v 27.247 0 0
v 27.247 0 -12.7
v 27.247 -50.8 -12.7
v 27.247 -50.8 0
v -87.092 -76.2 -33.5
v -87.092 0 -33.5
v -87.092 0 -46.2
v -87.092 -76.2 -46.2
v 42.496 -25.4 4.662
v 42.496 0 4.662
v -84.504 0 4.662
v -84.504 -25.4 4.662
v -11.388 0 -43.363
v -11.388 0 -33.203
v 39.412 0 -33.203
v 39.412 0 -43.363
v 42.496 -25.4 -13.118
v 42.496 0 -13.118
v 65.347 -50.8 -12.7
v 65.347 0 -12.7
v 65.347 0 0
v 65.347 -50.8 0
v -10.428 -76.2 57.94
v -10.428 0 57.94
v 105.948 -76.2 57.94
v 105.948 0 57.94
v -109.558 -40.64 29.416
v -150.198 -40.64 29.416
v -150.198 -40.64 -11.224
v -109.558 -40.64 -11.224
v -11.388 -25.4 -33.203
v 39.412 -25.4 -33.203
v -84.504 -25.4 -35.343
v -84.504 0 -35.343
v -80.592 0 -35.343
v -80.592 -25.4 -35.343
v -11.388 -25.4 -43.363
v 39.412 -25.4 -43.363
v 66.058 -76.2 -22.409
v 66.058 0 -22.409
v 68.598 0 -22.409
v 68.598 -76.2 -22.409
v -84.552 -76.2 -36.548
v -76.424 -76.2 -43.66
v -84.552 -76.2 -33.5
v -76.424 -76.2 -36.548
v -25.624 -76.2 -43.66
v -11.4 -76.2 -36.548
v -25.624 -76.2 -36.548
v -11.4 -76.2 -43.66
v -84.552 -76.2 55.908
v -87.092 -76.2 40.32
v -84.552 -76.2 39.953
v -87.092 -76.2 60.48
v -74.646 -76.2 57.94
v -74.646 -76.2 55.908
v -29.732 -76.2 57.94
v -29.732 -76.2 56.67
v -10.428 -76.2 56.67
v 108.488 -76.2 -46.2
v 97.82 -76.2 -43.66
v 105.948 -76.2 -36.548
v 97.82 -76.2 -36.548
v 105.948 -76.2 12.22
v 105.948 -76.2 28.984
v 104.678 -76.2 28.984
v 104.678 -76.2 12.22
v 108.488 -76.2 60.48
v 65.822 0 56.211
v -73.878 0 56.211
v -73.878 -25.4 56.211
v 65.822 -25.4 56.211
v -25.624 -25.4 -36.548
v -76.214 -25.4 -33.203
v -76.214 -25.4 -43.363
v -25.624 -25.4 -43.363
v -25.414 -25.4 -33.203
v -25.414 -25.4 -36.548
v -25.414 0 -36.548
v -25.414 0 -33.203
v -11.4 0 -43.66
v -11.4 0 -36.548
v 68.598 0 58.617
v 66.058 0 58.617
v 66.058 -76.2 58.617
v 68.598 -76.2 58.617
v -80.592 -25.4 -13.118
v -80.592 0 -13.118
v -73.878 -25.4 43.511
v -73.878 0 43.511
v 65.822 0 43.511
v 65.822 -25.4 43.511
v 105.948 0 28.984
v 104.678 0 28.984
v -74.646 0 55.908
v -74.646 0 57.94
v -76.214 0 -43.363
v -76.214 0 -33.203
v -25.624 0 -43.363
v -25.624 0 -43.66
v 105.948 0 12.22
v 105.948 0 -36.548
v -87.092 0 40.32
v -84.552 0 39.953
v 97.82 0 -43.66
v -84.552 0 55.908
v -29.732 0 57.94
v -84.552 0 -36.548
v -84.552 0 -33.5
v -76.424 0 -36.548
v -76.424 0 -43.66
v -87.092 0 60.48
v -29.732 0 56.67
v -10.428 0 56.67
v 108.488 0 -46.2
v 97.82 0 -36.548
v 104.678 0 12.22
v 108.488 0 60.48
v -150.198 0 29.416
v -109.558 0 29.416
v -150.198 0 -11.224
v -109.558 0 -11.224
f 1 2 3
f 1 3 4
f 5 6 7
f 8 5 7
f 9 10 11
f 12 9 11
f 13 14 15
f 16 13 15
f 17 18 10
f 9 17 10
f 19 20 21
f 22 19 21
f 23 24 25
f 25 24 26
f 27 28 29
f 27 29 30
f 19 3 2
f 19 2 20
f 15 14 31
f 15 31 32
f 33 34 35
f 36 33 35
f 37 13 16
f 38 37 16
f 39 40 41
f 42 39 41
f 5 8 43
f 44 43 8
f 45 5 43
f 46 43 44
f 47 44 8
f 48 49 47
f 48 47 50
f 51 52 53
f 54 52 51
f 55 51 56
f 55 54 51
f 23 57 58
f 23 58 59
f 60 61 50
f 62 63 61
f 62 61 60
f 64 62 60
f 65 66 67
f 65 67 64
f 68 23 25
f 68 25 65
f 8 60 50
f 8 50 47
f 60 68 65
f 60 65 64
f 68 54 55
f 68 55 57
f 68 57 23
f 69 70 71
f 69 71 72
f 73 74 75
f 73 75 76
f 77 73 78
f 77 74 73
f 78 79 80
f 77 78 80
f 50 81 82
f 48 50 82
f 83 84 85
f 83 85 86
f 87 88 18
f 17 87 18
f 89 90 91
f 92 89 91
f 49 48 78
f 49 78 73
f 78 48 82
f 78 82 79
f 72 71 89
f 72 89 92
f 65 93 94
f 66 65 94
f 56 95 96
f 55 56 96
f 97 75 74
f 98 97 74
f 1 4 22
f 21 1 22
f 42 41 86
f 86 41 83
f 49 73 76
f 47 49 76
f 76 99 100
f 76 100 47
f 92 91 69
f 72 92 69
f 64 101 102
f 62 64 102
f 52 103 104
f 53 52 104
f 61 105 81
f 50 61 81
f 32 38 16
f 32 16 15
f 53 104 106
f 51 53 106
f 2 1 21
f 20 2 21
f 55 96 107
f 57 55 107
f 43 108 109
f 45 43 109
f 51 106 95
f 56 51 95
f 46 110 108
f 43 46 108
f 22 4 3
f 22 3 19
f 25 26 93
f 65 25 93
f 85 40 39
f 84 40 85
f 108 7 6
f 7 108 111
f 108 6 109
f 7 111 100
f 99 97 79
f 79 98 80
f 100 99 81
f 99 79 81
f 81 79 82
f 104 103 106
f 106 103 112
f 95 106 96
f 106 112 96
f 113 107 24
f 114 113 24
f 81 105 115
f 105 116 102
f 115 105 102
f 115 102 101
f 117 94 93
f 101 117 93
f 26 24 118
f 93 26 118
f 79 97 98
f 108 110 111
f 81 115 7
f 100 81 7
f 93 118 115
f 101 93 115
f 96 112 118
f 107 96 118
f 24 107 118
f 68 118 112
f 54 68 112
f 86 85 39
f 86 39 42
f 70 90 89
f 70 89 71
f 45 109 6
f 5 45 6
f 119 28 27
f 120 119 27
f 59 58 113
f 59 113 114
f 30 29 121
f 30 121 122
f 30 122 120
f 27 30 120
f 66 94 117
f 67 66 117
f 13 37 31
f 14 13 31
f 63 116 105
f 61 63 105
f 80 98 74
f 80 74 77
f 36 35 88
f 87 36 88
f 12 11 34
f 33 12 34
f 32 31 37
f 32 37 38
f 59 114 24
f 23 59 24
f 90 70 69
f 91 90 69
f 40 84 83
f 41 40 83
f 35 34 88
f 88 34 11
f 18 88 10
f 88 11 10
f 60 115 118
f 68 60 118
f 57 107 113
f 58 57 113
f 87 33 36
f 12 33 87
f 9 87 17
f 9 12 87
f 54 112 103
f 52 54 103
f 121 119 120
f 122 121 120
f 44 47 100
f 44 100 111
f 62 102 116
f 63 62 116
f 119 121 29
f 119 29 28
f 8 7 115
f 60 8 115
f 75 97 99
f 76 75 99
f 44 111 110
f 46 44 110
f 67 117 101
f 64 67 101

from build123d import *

# Parameters (mm, degrees)
F6_DEPTH  = 76.2
F5_W      = 2.54
F5_H      = 81.026
F1_W      = 139.7
F1_H      = 12.7
F7_DEPTH  = 25.4
F3_W      = 50.8
F3_H      = 10.16
F4_W      = 3.9116963744
F4_H      = 17.78
F4_W_2    = 123.0883036256
F4_H_2    = 22.2250012395
F2_W      = 38.1
F2_H      = 12.7
F8_DEPTH  = 50.8
F9_W      = 40.64
F9_H      = 40.64
F10_DEPTH = 40.64


with BuildPart() as f6:
    # F0 (on Front) → F6 (new body)
    with BuildSketch(Plane.XZ):
        Polygon((-74.6464829862, 55.9084560133), (-74.6464829862, 57.9404560133), (-29.7320684276, 57.9404560133), (-29.7320684276, 56.6704560133), (-10.4280684276, 56.6704560133), (-10.4280684276, 57.9404560133), (105.9475170138, 57.9404560133), (105.9475170138, 28.9844560133), (104.6775170138, 28.9844560133), (104.6775170138, 12.2204560133), (105.9475170138, 12.2204560133), (105.9475170138, -36.5475439867), (97.8195170138, -36.5475439867), (97.8195170138, -43.6595439867), (-11.4004829862, -43.6595439867), (-11.4004829862, -36.5475439867), (-25.6244829862, -36.5475439867), (-25.6244829862, -43.6595439867), (-76.4244829862, -43.6595439867), (-76.4244829862, -36.5475439867), (-84.5524829862, -36.5475439867), (-84.5524829862, -33.4995439867), (-87.0924829862, -33.4995439867), (-87.0924829862, -46.1995439867), (108.4875170138, -46.1995439867), (108.4875170138, -43.6595439867), (108.4875170138, 60.4804560133), (-87.0924829862, 60.4804560133), (-87.0924829862, 40.320412819), (-84.5524829862, 39.9525031491), (-84.5524829862, 55.9084560133), align=None)
    extrude(amount=F6_DEPTH)

    # F3 (on face) → F7, piece 2 (join)
    with BuildSketch(Plane.XZ):
        with Locations((-50.8139037251, -38.283083154)):
            Rectangle(F3_W, F3_H)
    extrude(amount=F7_DEPTH)


with BuildPart() as f6b:
    # F5 (on Front) → F6, piece 2 (new body)
    with BuildSketch(Plane.XZ):
        with Locations((67.3280618, 18.1041830366)):
            Rectangle(F5_W, F5_H)
    extrude(amount=F6_DEPTH)


with BuildPart() as f7:
    # F1 (on Front) → F7 (new body)
    with BuildSketch(Plane.XZ):
        with Locations((-4.0278486848, 49.8614082277)):
            Rectangle(F1_W, F1_H)
    extrude(amount=F7_DEPTH)


with BuildPart() as f7b:
    # F3 (on face) → F7, piece 3 (new body)
    with BuildSketch(Plane.XZ):
        with Locations((14.0117149144, -38.283083154)):
            Rectangle(F3_W, F3_H)
    extrude(amount=F7_DEPTH)


with BuildPart() as f7c:
    # F4 (on Front) → F7, piece 4 (new body)
    with BuildSketch(Plane.XZ):
        with Locations((-82.5479365885, -4.2277628699)):
            Rectangle(F4_W, F4_H)
        with Locations((-19.0479365885, -4.2277628699)):
            Rectangle(F4_W_2, F4_H)
        with Locations((-82.5479365885, -24.2302634896)):
            Rectangle(F4_W, F4_H_2)
    extrude(amount=F7_DEPTH)


with BuildPart() as f8:
    # F2 (on Front) → F8 (new body)
    with BuildSketch(Plane.XZ):
        with Locations((46.296966958, -6.35)):
            Rectangle(F2_W, F2_H)
    extrude(amount=F8_DEPTH)


with BuildPart() as f10:
    # F9 (on Front) → F10 (new body)
    with BuildSketch(Plane.XZ):
        with Locations((-129.8780011606, 9.0961520222)):
            Rectangle(F9_W, F9_H)
    extrude(amount=F10_DEPTH)


solid = Compound([f6.part, f6b.part, f7.part, f7b.part, f7c.part, f8.part, f10.part])
